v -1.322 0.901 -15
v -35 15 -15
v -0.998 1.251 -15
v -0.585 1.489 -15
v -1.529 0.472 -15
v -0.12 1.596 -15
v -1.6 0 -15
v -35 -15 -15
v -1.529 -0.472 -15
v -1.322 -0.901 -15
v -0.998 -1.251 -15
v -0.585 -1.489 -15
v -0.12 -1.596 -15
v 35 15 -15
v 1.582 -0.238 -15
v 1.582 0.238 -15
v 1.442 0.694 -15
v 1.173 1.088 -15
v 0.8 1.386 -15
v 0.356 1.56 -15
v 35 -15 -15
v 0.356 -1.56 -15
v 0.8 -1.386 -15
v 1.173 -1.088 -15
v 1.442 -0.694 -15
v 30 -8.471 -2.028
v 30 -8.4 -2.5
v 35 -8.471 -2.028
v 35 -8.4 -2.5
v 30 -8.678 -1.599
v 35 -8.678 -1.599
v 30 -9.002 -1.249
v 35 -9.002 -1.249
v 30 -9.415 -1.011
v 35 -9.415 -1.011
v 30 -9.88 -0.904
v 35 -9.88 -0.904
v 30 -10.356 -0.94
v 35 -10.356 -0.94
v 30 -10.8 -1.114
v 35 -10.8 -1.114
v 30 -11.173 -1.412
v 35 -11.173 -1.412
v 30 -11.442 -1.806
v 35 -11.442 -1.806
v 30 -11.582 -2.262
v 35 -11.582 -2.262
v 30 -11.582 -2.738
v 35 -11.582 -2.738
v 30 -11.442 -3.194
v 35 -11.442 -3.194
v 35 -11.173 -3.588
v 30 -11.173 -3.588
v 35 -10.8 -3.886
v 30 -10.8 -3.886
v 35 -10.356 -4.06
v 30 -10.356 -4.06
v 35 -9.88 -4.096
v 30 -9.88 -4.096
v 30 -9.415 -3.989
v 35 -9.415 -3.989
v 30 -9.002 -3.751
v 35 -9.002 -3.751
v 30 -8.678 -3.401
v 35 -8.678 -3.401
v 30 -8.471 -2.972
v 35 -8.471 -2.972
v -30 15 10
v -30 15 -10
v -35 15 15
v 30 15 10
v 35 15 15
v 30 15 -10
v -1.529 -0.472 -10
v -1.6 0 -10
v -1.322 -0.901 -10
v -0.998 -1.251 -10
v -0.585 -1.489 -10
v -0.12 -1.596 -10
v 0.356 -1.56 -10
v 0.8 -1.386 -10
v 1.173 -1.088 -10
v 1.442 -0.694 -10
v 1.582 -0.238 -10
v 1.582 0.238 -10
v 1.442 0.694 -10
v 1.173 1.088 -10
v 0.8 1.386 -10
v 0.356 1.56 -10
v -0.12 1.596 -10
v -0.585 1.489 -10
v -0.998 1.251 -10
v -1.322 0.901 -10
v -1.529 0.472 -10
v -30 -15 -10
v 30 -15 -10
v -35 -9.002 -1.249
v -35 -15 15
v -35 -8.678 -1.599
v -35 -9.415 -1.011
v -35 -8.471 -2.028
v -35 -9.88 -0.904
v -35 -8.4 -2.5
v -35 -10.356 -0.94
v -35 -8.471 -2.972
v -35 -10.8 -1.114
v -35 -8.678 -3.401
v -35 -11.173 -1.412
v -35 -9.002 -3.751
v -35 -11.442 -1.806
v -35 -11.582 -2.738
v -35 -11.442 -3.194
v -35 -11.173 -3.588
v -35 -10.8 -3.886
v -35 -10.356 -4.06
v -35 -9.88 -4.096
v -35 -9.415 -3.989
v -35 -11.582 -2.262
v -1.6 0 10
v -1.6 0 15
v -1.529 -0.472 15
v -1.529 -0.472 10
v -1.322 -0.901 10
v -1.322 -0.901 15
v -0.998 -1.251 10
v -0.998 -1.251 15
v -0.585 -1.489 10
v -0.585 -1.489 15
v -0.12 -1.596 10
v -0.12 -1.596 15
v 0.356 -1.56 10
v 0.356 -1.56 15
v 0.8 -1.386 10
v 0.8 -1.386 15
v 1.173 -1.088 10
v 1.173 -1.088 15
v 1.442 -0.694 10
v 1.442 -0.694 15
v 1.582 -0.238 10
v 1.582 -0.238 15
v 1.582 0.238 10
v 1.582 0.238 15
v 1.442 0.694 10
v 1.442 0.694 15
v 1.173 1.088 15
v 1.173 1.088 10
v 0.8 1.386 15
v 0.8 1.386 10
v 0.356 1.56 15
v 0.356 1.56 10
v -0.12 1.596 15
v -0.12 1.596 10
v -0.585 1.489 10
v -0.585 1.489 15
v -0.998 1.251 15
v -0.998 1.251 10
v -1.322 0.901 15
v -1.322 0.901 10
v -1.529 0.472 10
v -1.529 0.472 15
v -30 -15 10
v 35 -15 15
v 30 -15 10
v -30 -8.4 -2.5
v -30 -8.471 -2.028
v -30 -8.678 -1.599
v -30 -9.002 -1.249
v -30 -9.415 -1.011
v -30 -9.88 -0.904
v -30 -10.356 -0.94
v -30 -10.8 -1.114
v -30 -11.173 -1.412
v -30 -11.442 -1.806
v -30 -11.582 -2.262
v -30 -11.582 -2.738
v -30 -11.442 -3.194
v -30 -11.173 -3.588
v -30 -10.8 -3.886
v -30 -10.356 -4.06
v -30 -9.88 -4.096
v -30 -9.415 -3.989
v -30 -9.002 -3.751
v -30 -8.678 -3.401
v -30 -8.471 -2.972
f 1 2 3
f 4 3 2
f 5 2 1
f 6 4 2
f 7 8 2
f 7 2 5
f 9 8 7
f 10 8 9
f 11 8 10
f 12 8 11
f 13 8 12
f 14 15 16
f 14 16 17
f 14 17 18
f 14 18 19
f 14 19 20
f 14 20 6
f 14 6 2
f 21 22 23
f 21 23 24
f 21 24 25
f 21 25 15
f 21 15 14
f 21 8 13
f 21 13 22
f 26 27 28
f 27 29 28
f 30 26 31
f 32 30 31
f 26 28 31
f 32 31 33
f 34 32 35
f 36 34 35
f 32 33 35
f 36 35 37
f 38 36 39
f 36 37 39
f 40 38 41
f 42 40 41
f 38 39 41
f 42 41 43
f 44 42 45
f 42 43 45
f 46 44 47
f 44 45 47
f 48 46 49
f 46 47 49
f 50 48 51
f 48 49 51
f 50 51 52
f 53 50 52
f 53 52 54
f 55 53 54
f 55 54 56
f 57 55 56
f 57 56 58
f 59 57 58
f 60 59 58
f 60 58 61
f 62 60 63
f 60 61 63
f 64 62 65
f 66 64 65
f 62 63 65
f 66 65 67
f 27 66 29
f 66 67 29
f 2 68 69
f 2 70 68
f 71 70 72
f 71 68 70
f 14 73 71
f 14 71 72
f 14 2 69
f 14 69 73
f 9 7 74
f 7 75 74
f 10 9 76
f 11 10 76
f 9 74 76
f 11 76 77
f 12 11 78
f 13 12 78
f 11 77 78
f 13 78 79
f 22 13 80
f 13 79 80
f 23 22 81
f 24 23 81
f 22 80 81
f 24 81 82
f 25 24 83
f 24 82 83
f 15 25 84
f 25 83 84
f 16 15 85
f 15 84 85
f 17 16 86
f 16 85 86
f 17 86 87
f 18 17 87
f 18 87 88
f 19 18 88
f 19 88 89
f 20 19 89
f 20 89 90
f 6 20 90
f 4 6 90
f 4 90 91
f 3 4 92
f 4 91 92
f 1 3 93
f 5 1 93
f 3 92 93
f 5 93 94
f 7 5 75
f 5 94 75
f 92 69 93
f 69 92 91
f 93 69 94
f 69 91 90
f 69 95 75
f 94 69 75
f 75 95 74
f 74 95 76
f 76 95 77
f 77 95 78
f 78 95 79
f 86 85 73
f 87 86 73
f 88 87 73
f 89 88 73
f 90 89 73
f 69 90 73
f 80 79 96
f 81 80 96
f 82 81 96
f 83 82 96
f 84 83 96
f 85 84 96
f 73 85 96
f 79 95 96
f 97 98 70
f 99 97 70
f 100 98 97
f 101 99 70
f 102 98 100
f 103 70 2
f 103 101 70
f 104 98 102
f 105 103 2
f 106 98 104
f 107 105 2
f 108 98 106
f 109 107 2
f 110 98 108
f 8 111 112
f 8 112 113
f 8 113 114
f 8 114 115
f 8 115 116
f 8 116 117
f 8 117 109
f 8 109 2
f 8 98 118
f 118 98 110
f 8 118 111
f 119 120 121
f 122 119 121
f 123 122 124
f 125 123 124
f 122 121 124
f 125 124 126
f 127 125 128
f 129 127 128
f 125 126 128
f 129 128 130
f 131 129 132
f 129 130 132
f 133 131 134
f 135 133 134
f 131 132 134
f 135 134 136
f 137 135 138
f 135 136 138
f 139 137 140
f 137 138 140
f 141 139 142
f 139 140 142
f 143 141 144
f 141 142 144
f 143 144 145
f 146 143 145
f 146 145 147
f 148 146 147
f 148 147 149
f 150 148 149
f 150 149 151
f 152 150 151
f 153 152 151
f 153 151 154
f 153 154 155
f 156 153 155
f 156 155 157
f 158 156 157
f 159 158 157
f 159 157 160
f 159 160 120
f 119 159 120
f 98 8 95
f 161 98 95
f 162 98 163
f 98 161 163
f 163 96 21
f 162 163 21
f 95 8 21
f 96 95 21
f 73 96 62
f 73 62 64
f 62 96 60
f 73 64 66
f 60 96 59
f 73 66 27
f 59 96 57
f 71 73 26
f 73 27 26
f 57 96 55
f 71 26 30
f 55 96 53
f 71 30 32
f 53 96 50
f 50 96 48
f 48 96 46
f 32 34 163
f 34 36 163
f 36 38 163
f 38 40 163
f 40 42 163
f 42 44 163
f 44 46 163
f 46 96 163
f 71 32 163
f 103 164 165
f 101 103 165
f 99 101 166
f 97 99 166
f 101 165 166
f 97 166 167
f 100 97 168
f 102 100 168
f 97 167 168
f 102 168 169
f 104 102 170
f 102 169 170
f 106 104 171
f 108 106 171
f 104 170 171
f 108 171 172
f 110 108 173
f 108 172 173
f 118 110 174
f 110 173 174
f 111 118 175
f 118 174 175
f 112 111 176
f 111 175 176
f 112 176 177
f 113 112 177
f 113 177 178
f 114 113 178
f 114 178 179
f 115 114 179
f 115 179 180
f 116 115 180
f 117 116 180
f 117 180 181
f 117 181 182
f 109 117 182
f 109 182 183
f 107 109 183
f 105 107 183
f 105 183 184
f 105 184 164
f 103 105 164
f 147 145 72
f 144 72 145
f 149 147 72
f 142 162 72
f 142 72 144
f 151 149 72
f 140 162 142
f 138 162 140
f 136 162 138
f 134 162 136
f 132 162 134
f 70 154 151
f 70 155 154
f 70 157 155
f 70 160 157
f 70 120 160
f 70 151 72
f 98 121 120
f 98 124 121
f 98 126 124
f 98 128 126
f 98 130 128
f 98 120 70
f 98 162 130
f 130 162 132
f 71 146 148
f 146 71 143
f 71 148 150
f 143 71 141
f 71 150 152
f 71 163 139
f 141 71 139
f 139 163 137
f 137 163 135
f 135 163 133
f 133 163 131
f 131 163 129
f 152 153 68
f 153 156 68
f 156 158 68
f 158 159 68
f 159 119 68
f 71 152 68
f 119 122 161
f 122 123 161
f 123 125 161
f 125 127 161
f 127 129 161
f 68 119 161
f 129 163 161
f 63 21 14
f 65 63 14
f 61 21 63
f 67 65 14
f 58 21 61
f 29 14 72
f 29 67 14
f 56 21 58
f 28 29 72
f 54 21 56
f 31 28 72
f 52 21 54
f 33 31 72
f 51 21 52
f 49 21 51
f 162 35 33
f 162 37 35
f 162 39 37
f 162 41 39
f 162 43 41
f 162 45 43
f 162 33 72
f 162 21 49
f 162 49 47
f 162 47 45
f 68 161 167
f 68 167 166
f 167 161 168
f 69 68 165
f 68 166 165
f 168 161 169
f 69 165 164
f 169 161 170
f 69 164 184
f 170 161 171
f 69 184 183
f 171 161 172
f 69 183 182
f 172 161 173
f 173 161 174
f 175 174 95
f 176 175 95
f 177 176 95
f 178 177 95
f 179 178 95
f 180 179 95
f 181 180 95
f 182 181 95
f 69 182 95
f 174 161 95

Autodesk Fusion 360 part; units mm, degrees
sketch "Sketch1" plane through (0, 0, 0) normal (0, 1, 0) x (1, 0, 0)
  line L0 (35, -15) -> (-35, -15)
  line L1 (-35, -15) -> (-35, 15)
  line L2 (-35, 15) -> (35, 15)
  line L3 (35, 15) -> (35, -15)
  line L4 (35, -15) -> (-35, 15) construction
  line L5 (-35, -15) -> (35, 15) construction
  line L6 (-30, 10) -> (30, 10)
  line L7 (30, 10) -> (30, -10)
  line L8 (30, -10) -> (-30, -10)
  line L9 (-30, -10) -> (-30, 10)
  dimension "d1" = 70
  dimension "d2" = 30
  dimension "d3" = 5
extrude "Extrude1" add sketch "Sketch1" along normal mid plane 30
sketch "Sketch2" plane through (35, 0, 0) normal (1, 0, 0) x (0, 1, 0)
  line L0 (-15, -15) -> (15, -15)
  line L1 (15, -15) -> (15, 15)
  line L2 (15, 15) -> (-15, 15)
  line L3 (-15, 15) -> (-15, -15)
  circle A0 centre (-10, -2.5) radius 1.6
  dimension "d6" = 3.2
  dimension "d7" = 12.5
  dimension "d8" = 5
extrude "Extrude2" cut sketch "Sketch2" against normal blind 76 contours A0
sketch "Sketch3" plane through (0, 0, 15) normal (0, 0, 1) x (-1, 0, 0)
  line L0 (-35, 15) -> (-35, -15)
  line L1 (-35, -15) -> (35, -15)
  line L2 (35, -15) -> (35, 15)
  line L3 (35, 15) -> (-35, 15)
  circle A0 centre (0, 0) radius 1.6
  dimension "d11" = 3.2
extrude "Extrude3" cut sketch "Sketch3" against normal blind 41 contours A0
equation "d7 = ( 25 / 2 ) * 1 mm"
